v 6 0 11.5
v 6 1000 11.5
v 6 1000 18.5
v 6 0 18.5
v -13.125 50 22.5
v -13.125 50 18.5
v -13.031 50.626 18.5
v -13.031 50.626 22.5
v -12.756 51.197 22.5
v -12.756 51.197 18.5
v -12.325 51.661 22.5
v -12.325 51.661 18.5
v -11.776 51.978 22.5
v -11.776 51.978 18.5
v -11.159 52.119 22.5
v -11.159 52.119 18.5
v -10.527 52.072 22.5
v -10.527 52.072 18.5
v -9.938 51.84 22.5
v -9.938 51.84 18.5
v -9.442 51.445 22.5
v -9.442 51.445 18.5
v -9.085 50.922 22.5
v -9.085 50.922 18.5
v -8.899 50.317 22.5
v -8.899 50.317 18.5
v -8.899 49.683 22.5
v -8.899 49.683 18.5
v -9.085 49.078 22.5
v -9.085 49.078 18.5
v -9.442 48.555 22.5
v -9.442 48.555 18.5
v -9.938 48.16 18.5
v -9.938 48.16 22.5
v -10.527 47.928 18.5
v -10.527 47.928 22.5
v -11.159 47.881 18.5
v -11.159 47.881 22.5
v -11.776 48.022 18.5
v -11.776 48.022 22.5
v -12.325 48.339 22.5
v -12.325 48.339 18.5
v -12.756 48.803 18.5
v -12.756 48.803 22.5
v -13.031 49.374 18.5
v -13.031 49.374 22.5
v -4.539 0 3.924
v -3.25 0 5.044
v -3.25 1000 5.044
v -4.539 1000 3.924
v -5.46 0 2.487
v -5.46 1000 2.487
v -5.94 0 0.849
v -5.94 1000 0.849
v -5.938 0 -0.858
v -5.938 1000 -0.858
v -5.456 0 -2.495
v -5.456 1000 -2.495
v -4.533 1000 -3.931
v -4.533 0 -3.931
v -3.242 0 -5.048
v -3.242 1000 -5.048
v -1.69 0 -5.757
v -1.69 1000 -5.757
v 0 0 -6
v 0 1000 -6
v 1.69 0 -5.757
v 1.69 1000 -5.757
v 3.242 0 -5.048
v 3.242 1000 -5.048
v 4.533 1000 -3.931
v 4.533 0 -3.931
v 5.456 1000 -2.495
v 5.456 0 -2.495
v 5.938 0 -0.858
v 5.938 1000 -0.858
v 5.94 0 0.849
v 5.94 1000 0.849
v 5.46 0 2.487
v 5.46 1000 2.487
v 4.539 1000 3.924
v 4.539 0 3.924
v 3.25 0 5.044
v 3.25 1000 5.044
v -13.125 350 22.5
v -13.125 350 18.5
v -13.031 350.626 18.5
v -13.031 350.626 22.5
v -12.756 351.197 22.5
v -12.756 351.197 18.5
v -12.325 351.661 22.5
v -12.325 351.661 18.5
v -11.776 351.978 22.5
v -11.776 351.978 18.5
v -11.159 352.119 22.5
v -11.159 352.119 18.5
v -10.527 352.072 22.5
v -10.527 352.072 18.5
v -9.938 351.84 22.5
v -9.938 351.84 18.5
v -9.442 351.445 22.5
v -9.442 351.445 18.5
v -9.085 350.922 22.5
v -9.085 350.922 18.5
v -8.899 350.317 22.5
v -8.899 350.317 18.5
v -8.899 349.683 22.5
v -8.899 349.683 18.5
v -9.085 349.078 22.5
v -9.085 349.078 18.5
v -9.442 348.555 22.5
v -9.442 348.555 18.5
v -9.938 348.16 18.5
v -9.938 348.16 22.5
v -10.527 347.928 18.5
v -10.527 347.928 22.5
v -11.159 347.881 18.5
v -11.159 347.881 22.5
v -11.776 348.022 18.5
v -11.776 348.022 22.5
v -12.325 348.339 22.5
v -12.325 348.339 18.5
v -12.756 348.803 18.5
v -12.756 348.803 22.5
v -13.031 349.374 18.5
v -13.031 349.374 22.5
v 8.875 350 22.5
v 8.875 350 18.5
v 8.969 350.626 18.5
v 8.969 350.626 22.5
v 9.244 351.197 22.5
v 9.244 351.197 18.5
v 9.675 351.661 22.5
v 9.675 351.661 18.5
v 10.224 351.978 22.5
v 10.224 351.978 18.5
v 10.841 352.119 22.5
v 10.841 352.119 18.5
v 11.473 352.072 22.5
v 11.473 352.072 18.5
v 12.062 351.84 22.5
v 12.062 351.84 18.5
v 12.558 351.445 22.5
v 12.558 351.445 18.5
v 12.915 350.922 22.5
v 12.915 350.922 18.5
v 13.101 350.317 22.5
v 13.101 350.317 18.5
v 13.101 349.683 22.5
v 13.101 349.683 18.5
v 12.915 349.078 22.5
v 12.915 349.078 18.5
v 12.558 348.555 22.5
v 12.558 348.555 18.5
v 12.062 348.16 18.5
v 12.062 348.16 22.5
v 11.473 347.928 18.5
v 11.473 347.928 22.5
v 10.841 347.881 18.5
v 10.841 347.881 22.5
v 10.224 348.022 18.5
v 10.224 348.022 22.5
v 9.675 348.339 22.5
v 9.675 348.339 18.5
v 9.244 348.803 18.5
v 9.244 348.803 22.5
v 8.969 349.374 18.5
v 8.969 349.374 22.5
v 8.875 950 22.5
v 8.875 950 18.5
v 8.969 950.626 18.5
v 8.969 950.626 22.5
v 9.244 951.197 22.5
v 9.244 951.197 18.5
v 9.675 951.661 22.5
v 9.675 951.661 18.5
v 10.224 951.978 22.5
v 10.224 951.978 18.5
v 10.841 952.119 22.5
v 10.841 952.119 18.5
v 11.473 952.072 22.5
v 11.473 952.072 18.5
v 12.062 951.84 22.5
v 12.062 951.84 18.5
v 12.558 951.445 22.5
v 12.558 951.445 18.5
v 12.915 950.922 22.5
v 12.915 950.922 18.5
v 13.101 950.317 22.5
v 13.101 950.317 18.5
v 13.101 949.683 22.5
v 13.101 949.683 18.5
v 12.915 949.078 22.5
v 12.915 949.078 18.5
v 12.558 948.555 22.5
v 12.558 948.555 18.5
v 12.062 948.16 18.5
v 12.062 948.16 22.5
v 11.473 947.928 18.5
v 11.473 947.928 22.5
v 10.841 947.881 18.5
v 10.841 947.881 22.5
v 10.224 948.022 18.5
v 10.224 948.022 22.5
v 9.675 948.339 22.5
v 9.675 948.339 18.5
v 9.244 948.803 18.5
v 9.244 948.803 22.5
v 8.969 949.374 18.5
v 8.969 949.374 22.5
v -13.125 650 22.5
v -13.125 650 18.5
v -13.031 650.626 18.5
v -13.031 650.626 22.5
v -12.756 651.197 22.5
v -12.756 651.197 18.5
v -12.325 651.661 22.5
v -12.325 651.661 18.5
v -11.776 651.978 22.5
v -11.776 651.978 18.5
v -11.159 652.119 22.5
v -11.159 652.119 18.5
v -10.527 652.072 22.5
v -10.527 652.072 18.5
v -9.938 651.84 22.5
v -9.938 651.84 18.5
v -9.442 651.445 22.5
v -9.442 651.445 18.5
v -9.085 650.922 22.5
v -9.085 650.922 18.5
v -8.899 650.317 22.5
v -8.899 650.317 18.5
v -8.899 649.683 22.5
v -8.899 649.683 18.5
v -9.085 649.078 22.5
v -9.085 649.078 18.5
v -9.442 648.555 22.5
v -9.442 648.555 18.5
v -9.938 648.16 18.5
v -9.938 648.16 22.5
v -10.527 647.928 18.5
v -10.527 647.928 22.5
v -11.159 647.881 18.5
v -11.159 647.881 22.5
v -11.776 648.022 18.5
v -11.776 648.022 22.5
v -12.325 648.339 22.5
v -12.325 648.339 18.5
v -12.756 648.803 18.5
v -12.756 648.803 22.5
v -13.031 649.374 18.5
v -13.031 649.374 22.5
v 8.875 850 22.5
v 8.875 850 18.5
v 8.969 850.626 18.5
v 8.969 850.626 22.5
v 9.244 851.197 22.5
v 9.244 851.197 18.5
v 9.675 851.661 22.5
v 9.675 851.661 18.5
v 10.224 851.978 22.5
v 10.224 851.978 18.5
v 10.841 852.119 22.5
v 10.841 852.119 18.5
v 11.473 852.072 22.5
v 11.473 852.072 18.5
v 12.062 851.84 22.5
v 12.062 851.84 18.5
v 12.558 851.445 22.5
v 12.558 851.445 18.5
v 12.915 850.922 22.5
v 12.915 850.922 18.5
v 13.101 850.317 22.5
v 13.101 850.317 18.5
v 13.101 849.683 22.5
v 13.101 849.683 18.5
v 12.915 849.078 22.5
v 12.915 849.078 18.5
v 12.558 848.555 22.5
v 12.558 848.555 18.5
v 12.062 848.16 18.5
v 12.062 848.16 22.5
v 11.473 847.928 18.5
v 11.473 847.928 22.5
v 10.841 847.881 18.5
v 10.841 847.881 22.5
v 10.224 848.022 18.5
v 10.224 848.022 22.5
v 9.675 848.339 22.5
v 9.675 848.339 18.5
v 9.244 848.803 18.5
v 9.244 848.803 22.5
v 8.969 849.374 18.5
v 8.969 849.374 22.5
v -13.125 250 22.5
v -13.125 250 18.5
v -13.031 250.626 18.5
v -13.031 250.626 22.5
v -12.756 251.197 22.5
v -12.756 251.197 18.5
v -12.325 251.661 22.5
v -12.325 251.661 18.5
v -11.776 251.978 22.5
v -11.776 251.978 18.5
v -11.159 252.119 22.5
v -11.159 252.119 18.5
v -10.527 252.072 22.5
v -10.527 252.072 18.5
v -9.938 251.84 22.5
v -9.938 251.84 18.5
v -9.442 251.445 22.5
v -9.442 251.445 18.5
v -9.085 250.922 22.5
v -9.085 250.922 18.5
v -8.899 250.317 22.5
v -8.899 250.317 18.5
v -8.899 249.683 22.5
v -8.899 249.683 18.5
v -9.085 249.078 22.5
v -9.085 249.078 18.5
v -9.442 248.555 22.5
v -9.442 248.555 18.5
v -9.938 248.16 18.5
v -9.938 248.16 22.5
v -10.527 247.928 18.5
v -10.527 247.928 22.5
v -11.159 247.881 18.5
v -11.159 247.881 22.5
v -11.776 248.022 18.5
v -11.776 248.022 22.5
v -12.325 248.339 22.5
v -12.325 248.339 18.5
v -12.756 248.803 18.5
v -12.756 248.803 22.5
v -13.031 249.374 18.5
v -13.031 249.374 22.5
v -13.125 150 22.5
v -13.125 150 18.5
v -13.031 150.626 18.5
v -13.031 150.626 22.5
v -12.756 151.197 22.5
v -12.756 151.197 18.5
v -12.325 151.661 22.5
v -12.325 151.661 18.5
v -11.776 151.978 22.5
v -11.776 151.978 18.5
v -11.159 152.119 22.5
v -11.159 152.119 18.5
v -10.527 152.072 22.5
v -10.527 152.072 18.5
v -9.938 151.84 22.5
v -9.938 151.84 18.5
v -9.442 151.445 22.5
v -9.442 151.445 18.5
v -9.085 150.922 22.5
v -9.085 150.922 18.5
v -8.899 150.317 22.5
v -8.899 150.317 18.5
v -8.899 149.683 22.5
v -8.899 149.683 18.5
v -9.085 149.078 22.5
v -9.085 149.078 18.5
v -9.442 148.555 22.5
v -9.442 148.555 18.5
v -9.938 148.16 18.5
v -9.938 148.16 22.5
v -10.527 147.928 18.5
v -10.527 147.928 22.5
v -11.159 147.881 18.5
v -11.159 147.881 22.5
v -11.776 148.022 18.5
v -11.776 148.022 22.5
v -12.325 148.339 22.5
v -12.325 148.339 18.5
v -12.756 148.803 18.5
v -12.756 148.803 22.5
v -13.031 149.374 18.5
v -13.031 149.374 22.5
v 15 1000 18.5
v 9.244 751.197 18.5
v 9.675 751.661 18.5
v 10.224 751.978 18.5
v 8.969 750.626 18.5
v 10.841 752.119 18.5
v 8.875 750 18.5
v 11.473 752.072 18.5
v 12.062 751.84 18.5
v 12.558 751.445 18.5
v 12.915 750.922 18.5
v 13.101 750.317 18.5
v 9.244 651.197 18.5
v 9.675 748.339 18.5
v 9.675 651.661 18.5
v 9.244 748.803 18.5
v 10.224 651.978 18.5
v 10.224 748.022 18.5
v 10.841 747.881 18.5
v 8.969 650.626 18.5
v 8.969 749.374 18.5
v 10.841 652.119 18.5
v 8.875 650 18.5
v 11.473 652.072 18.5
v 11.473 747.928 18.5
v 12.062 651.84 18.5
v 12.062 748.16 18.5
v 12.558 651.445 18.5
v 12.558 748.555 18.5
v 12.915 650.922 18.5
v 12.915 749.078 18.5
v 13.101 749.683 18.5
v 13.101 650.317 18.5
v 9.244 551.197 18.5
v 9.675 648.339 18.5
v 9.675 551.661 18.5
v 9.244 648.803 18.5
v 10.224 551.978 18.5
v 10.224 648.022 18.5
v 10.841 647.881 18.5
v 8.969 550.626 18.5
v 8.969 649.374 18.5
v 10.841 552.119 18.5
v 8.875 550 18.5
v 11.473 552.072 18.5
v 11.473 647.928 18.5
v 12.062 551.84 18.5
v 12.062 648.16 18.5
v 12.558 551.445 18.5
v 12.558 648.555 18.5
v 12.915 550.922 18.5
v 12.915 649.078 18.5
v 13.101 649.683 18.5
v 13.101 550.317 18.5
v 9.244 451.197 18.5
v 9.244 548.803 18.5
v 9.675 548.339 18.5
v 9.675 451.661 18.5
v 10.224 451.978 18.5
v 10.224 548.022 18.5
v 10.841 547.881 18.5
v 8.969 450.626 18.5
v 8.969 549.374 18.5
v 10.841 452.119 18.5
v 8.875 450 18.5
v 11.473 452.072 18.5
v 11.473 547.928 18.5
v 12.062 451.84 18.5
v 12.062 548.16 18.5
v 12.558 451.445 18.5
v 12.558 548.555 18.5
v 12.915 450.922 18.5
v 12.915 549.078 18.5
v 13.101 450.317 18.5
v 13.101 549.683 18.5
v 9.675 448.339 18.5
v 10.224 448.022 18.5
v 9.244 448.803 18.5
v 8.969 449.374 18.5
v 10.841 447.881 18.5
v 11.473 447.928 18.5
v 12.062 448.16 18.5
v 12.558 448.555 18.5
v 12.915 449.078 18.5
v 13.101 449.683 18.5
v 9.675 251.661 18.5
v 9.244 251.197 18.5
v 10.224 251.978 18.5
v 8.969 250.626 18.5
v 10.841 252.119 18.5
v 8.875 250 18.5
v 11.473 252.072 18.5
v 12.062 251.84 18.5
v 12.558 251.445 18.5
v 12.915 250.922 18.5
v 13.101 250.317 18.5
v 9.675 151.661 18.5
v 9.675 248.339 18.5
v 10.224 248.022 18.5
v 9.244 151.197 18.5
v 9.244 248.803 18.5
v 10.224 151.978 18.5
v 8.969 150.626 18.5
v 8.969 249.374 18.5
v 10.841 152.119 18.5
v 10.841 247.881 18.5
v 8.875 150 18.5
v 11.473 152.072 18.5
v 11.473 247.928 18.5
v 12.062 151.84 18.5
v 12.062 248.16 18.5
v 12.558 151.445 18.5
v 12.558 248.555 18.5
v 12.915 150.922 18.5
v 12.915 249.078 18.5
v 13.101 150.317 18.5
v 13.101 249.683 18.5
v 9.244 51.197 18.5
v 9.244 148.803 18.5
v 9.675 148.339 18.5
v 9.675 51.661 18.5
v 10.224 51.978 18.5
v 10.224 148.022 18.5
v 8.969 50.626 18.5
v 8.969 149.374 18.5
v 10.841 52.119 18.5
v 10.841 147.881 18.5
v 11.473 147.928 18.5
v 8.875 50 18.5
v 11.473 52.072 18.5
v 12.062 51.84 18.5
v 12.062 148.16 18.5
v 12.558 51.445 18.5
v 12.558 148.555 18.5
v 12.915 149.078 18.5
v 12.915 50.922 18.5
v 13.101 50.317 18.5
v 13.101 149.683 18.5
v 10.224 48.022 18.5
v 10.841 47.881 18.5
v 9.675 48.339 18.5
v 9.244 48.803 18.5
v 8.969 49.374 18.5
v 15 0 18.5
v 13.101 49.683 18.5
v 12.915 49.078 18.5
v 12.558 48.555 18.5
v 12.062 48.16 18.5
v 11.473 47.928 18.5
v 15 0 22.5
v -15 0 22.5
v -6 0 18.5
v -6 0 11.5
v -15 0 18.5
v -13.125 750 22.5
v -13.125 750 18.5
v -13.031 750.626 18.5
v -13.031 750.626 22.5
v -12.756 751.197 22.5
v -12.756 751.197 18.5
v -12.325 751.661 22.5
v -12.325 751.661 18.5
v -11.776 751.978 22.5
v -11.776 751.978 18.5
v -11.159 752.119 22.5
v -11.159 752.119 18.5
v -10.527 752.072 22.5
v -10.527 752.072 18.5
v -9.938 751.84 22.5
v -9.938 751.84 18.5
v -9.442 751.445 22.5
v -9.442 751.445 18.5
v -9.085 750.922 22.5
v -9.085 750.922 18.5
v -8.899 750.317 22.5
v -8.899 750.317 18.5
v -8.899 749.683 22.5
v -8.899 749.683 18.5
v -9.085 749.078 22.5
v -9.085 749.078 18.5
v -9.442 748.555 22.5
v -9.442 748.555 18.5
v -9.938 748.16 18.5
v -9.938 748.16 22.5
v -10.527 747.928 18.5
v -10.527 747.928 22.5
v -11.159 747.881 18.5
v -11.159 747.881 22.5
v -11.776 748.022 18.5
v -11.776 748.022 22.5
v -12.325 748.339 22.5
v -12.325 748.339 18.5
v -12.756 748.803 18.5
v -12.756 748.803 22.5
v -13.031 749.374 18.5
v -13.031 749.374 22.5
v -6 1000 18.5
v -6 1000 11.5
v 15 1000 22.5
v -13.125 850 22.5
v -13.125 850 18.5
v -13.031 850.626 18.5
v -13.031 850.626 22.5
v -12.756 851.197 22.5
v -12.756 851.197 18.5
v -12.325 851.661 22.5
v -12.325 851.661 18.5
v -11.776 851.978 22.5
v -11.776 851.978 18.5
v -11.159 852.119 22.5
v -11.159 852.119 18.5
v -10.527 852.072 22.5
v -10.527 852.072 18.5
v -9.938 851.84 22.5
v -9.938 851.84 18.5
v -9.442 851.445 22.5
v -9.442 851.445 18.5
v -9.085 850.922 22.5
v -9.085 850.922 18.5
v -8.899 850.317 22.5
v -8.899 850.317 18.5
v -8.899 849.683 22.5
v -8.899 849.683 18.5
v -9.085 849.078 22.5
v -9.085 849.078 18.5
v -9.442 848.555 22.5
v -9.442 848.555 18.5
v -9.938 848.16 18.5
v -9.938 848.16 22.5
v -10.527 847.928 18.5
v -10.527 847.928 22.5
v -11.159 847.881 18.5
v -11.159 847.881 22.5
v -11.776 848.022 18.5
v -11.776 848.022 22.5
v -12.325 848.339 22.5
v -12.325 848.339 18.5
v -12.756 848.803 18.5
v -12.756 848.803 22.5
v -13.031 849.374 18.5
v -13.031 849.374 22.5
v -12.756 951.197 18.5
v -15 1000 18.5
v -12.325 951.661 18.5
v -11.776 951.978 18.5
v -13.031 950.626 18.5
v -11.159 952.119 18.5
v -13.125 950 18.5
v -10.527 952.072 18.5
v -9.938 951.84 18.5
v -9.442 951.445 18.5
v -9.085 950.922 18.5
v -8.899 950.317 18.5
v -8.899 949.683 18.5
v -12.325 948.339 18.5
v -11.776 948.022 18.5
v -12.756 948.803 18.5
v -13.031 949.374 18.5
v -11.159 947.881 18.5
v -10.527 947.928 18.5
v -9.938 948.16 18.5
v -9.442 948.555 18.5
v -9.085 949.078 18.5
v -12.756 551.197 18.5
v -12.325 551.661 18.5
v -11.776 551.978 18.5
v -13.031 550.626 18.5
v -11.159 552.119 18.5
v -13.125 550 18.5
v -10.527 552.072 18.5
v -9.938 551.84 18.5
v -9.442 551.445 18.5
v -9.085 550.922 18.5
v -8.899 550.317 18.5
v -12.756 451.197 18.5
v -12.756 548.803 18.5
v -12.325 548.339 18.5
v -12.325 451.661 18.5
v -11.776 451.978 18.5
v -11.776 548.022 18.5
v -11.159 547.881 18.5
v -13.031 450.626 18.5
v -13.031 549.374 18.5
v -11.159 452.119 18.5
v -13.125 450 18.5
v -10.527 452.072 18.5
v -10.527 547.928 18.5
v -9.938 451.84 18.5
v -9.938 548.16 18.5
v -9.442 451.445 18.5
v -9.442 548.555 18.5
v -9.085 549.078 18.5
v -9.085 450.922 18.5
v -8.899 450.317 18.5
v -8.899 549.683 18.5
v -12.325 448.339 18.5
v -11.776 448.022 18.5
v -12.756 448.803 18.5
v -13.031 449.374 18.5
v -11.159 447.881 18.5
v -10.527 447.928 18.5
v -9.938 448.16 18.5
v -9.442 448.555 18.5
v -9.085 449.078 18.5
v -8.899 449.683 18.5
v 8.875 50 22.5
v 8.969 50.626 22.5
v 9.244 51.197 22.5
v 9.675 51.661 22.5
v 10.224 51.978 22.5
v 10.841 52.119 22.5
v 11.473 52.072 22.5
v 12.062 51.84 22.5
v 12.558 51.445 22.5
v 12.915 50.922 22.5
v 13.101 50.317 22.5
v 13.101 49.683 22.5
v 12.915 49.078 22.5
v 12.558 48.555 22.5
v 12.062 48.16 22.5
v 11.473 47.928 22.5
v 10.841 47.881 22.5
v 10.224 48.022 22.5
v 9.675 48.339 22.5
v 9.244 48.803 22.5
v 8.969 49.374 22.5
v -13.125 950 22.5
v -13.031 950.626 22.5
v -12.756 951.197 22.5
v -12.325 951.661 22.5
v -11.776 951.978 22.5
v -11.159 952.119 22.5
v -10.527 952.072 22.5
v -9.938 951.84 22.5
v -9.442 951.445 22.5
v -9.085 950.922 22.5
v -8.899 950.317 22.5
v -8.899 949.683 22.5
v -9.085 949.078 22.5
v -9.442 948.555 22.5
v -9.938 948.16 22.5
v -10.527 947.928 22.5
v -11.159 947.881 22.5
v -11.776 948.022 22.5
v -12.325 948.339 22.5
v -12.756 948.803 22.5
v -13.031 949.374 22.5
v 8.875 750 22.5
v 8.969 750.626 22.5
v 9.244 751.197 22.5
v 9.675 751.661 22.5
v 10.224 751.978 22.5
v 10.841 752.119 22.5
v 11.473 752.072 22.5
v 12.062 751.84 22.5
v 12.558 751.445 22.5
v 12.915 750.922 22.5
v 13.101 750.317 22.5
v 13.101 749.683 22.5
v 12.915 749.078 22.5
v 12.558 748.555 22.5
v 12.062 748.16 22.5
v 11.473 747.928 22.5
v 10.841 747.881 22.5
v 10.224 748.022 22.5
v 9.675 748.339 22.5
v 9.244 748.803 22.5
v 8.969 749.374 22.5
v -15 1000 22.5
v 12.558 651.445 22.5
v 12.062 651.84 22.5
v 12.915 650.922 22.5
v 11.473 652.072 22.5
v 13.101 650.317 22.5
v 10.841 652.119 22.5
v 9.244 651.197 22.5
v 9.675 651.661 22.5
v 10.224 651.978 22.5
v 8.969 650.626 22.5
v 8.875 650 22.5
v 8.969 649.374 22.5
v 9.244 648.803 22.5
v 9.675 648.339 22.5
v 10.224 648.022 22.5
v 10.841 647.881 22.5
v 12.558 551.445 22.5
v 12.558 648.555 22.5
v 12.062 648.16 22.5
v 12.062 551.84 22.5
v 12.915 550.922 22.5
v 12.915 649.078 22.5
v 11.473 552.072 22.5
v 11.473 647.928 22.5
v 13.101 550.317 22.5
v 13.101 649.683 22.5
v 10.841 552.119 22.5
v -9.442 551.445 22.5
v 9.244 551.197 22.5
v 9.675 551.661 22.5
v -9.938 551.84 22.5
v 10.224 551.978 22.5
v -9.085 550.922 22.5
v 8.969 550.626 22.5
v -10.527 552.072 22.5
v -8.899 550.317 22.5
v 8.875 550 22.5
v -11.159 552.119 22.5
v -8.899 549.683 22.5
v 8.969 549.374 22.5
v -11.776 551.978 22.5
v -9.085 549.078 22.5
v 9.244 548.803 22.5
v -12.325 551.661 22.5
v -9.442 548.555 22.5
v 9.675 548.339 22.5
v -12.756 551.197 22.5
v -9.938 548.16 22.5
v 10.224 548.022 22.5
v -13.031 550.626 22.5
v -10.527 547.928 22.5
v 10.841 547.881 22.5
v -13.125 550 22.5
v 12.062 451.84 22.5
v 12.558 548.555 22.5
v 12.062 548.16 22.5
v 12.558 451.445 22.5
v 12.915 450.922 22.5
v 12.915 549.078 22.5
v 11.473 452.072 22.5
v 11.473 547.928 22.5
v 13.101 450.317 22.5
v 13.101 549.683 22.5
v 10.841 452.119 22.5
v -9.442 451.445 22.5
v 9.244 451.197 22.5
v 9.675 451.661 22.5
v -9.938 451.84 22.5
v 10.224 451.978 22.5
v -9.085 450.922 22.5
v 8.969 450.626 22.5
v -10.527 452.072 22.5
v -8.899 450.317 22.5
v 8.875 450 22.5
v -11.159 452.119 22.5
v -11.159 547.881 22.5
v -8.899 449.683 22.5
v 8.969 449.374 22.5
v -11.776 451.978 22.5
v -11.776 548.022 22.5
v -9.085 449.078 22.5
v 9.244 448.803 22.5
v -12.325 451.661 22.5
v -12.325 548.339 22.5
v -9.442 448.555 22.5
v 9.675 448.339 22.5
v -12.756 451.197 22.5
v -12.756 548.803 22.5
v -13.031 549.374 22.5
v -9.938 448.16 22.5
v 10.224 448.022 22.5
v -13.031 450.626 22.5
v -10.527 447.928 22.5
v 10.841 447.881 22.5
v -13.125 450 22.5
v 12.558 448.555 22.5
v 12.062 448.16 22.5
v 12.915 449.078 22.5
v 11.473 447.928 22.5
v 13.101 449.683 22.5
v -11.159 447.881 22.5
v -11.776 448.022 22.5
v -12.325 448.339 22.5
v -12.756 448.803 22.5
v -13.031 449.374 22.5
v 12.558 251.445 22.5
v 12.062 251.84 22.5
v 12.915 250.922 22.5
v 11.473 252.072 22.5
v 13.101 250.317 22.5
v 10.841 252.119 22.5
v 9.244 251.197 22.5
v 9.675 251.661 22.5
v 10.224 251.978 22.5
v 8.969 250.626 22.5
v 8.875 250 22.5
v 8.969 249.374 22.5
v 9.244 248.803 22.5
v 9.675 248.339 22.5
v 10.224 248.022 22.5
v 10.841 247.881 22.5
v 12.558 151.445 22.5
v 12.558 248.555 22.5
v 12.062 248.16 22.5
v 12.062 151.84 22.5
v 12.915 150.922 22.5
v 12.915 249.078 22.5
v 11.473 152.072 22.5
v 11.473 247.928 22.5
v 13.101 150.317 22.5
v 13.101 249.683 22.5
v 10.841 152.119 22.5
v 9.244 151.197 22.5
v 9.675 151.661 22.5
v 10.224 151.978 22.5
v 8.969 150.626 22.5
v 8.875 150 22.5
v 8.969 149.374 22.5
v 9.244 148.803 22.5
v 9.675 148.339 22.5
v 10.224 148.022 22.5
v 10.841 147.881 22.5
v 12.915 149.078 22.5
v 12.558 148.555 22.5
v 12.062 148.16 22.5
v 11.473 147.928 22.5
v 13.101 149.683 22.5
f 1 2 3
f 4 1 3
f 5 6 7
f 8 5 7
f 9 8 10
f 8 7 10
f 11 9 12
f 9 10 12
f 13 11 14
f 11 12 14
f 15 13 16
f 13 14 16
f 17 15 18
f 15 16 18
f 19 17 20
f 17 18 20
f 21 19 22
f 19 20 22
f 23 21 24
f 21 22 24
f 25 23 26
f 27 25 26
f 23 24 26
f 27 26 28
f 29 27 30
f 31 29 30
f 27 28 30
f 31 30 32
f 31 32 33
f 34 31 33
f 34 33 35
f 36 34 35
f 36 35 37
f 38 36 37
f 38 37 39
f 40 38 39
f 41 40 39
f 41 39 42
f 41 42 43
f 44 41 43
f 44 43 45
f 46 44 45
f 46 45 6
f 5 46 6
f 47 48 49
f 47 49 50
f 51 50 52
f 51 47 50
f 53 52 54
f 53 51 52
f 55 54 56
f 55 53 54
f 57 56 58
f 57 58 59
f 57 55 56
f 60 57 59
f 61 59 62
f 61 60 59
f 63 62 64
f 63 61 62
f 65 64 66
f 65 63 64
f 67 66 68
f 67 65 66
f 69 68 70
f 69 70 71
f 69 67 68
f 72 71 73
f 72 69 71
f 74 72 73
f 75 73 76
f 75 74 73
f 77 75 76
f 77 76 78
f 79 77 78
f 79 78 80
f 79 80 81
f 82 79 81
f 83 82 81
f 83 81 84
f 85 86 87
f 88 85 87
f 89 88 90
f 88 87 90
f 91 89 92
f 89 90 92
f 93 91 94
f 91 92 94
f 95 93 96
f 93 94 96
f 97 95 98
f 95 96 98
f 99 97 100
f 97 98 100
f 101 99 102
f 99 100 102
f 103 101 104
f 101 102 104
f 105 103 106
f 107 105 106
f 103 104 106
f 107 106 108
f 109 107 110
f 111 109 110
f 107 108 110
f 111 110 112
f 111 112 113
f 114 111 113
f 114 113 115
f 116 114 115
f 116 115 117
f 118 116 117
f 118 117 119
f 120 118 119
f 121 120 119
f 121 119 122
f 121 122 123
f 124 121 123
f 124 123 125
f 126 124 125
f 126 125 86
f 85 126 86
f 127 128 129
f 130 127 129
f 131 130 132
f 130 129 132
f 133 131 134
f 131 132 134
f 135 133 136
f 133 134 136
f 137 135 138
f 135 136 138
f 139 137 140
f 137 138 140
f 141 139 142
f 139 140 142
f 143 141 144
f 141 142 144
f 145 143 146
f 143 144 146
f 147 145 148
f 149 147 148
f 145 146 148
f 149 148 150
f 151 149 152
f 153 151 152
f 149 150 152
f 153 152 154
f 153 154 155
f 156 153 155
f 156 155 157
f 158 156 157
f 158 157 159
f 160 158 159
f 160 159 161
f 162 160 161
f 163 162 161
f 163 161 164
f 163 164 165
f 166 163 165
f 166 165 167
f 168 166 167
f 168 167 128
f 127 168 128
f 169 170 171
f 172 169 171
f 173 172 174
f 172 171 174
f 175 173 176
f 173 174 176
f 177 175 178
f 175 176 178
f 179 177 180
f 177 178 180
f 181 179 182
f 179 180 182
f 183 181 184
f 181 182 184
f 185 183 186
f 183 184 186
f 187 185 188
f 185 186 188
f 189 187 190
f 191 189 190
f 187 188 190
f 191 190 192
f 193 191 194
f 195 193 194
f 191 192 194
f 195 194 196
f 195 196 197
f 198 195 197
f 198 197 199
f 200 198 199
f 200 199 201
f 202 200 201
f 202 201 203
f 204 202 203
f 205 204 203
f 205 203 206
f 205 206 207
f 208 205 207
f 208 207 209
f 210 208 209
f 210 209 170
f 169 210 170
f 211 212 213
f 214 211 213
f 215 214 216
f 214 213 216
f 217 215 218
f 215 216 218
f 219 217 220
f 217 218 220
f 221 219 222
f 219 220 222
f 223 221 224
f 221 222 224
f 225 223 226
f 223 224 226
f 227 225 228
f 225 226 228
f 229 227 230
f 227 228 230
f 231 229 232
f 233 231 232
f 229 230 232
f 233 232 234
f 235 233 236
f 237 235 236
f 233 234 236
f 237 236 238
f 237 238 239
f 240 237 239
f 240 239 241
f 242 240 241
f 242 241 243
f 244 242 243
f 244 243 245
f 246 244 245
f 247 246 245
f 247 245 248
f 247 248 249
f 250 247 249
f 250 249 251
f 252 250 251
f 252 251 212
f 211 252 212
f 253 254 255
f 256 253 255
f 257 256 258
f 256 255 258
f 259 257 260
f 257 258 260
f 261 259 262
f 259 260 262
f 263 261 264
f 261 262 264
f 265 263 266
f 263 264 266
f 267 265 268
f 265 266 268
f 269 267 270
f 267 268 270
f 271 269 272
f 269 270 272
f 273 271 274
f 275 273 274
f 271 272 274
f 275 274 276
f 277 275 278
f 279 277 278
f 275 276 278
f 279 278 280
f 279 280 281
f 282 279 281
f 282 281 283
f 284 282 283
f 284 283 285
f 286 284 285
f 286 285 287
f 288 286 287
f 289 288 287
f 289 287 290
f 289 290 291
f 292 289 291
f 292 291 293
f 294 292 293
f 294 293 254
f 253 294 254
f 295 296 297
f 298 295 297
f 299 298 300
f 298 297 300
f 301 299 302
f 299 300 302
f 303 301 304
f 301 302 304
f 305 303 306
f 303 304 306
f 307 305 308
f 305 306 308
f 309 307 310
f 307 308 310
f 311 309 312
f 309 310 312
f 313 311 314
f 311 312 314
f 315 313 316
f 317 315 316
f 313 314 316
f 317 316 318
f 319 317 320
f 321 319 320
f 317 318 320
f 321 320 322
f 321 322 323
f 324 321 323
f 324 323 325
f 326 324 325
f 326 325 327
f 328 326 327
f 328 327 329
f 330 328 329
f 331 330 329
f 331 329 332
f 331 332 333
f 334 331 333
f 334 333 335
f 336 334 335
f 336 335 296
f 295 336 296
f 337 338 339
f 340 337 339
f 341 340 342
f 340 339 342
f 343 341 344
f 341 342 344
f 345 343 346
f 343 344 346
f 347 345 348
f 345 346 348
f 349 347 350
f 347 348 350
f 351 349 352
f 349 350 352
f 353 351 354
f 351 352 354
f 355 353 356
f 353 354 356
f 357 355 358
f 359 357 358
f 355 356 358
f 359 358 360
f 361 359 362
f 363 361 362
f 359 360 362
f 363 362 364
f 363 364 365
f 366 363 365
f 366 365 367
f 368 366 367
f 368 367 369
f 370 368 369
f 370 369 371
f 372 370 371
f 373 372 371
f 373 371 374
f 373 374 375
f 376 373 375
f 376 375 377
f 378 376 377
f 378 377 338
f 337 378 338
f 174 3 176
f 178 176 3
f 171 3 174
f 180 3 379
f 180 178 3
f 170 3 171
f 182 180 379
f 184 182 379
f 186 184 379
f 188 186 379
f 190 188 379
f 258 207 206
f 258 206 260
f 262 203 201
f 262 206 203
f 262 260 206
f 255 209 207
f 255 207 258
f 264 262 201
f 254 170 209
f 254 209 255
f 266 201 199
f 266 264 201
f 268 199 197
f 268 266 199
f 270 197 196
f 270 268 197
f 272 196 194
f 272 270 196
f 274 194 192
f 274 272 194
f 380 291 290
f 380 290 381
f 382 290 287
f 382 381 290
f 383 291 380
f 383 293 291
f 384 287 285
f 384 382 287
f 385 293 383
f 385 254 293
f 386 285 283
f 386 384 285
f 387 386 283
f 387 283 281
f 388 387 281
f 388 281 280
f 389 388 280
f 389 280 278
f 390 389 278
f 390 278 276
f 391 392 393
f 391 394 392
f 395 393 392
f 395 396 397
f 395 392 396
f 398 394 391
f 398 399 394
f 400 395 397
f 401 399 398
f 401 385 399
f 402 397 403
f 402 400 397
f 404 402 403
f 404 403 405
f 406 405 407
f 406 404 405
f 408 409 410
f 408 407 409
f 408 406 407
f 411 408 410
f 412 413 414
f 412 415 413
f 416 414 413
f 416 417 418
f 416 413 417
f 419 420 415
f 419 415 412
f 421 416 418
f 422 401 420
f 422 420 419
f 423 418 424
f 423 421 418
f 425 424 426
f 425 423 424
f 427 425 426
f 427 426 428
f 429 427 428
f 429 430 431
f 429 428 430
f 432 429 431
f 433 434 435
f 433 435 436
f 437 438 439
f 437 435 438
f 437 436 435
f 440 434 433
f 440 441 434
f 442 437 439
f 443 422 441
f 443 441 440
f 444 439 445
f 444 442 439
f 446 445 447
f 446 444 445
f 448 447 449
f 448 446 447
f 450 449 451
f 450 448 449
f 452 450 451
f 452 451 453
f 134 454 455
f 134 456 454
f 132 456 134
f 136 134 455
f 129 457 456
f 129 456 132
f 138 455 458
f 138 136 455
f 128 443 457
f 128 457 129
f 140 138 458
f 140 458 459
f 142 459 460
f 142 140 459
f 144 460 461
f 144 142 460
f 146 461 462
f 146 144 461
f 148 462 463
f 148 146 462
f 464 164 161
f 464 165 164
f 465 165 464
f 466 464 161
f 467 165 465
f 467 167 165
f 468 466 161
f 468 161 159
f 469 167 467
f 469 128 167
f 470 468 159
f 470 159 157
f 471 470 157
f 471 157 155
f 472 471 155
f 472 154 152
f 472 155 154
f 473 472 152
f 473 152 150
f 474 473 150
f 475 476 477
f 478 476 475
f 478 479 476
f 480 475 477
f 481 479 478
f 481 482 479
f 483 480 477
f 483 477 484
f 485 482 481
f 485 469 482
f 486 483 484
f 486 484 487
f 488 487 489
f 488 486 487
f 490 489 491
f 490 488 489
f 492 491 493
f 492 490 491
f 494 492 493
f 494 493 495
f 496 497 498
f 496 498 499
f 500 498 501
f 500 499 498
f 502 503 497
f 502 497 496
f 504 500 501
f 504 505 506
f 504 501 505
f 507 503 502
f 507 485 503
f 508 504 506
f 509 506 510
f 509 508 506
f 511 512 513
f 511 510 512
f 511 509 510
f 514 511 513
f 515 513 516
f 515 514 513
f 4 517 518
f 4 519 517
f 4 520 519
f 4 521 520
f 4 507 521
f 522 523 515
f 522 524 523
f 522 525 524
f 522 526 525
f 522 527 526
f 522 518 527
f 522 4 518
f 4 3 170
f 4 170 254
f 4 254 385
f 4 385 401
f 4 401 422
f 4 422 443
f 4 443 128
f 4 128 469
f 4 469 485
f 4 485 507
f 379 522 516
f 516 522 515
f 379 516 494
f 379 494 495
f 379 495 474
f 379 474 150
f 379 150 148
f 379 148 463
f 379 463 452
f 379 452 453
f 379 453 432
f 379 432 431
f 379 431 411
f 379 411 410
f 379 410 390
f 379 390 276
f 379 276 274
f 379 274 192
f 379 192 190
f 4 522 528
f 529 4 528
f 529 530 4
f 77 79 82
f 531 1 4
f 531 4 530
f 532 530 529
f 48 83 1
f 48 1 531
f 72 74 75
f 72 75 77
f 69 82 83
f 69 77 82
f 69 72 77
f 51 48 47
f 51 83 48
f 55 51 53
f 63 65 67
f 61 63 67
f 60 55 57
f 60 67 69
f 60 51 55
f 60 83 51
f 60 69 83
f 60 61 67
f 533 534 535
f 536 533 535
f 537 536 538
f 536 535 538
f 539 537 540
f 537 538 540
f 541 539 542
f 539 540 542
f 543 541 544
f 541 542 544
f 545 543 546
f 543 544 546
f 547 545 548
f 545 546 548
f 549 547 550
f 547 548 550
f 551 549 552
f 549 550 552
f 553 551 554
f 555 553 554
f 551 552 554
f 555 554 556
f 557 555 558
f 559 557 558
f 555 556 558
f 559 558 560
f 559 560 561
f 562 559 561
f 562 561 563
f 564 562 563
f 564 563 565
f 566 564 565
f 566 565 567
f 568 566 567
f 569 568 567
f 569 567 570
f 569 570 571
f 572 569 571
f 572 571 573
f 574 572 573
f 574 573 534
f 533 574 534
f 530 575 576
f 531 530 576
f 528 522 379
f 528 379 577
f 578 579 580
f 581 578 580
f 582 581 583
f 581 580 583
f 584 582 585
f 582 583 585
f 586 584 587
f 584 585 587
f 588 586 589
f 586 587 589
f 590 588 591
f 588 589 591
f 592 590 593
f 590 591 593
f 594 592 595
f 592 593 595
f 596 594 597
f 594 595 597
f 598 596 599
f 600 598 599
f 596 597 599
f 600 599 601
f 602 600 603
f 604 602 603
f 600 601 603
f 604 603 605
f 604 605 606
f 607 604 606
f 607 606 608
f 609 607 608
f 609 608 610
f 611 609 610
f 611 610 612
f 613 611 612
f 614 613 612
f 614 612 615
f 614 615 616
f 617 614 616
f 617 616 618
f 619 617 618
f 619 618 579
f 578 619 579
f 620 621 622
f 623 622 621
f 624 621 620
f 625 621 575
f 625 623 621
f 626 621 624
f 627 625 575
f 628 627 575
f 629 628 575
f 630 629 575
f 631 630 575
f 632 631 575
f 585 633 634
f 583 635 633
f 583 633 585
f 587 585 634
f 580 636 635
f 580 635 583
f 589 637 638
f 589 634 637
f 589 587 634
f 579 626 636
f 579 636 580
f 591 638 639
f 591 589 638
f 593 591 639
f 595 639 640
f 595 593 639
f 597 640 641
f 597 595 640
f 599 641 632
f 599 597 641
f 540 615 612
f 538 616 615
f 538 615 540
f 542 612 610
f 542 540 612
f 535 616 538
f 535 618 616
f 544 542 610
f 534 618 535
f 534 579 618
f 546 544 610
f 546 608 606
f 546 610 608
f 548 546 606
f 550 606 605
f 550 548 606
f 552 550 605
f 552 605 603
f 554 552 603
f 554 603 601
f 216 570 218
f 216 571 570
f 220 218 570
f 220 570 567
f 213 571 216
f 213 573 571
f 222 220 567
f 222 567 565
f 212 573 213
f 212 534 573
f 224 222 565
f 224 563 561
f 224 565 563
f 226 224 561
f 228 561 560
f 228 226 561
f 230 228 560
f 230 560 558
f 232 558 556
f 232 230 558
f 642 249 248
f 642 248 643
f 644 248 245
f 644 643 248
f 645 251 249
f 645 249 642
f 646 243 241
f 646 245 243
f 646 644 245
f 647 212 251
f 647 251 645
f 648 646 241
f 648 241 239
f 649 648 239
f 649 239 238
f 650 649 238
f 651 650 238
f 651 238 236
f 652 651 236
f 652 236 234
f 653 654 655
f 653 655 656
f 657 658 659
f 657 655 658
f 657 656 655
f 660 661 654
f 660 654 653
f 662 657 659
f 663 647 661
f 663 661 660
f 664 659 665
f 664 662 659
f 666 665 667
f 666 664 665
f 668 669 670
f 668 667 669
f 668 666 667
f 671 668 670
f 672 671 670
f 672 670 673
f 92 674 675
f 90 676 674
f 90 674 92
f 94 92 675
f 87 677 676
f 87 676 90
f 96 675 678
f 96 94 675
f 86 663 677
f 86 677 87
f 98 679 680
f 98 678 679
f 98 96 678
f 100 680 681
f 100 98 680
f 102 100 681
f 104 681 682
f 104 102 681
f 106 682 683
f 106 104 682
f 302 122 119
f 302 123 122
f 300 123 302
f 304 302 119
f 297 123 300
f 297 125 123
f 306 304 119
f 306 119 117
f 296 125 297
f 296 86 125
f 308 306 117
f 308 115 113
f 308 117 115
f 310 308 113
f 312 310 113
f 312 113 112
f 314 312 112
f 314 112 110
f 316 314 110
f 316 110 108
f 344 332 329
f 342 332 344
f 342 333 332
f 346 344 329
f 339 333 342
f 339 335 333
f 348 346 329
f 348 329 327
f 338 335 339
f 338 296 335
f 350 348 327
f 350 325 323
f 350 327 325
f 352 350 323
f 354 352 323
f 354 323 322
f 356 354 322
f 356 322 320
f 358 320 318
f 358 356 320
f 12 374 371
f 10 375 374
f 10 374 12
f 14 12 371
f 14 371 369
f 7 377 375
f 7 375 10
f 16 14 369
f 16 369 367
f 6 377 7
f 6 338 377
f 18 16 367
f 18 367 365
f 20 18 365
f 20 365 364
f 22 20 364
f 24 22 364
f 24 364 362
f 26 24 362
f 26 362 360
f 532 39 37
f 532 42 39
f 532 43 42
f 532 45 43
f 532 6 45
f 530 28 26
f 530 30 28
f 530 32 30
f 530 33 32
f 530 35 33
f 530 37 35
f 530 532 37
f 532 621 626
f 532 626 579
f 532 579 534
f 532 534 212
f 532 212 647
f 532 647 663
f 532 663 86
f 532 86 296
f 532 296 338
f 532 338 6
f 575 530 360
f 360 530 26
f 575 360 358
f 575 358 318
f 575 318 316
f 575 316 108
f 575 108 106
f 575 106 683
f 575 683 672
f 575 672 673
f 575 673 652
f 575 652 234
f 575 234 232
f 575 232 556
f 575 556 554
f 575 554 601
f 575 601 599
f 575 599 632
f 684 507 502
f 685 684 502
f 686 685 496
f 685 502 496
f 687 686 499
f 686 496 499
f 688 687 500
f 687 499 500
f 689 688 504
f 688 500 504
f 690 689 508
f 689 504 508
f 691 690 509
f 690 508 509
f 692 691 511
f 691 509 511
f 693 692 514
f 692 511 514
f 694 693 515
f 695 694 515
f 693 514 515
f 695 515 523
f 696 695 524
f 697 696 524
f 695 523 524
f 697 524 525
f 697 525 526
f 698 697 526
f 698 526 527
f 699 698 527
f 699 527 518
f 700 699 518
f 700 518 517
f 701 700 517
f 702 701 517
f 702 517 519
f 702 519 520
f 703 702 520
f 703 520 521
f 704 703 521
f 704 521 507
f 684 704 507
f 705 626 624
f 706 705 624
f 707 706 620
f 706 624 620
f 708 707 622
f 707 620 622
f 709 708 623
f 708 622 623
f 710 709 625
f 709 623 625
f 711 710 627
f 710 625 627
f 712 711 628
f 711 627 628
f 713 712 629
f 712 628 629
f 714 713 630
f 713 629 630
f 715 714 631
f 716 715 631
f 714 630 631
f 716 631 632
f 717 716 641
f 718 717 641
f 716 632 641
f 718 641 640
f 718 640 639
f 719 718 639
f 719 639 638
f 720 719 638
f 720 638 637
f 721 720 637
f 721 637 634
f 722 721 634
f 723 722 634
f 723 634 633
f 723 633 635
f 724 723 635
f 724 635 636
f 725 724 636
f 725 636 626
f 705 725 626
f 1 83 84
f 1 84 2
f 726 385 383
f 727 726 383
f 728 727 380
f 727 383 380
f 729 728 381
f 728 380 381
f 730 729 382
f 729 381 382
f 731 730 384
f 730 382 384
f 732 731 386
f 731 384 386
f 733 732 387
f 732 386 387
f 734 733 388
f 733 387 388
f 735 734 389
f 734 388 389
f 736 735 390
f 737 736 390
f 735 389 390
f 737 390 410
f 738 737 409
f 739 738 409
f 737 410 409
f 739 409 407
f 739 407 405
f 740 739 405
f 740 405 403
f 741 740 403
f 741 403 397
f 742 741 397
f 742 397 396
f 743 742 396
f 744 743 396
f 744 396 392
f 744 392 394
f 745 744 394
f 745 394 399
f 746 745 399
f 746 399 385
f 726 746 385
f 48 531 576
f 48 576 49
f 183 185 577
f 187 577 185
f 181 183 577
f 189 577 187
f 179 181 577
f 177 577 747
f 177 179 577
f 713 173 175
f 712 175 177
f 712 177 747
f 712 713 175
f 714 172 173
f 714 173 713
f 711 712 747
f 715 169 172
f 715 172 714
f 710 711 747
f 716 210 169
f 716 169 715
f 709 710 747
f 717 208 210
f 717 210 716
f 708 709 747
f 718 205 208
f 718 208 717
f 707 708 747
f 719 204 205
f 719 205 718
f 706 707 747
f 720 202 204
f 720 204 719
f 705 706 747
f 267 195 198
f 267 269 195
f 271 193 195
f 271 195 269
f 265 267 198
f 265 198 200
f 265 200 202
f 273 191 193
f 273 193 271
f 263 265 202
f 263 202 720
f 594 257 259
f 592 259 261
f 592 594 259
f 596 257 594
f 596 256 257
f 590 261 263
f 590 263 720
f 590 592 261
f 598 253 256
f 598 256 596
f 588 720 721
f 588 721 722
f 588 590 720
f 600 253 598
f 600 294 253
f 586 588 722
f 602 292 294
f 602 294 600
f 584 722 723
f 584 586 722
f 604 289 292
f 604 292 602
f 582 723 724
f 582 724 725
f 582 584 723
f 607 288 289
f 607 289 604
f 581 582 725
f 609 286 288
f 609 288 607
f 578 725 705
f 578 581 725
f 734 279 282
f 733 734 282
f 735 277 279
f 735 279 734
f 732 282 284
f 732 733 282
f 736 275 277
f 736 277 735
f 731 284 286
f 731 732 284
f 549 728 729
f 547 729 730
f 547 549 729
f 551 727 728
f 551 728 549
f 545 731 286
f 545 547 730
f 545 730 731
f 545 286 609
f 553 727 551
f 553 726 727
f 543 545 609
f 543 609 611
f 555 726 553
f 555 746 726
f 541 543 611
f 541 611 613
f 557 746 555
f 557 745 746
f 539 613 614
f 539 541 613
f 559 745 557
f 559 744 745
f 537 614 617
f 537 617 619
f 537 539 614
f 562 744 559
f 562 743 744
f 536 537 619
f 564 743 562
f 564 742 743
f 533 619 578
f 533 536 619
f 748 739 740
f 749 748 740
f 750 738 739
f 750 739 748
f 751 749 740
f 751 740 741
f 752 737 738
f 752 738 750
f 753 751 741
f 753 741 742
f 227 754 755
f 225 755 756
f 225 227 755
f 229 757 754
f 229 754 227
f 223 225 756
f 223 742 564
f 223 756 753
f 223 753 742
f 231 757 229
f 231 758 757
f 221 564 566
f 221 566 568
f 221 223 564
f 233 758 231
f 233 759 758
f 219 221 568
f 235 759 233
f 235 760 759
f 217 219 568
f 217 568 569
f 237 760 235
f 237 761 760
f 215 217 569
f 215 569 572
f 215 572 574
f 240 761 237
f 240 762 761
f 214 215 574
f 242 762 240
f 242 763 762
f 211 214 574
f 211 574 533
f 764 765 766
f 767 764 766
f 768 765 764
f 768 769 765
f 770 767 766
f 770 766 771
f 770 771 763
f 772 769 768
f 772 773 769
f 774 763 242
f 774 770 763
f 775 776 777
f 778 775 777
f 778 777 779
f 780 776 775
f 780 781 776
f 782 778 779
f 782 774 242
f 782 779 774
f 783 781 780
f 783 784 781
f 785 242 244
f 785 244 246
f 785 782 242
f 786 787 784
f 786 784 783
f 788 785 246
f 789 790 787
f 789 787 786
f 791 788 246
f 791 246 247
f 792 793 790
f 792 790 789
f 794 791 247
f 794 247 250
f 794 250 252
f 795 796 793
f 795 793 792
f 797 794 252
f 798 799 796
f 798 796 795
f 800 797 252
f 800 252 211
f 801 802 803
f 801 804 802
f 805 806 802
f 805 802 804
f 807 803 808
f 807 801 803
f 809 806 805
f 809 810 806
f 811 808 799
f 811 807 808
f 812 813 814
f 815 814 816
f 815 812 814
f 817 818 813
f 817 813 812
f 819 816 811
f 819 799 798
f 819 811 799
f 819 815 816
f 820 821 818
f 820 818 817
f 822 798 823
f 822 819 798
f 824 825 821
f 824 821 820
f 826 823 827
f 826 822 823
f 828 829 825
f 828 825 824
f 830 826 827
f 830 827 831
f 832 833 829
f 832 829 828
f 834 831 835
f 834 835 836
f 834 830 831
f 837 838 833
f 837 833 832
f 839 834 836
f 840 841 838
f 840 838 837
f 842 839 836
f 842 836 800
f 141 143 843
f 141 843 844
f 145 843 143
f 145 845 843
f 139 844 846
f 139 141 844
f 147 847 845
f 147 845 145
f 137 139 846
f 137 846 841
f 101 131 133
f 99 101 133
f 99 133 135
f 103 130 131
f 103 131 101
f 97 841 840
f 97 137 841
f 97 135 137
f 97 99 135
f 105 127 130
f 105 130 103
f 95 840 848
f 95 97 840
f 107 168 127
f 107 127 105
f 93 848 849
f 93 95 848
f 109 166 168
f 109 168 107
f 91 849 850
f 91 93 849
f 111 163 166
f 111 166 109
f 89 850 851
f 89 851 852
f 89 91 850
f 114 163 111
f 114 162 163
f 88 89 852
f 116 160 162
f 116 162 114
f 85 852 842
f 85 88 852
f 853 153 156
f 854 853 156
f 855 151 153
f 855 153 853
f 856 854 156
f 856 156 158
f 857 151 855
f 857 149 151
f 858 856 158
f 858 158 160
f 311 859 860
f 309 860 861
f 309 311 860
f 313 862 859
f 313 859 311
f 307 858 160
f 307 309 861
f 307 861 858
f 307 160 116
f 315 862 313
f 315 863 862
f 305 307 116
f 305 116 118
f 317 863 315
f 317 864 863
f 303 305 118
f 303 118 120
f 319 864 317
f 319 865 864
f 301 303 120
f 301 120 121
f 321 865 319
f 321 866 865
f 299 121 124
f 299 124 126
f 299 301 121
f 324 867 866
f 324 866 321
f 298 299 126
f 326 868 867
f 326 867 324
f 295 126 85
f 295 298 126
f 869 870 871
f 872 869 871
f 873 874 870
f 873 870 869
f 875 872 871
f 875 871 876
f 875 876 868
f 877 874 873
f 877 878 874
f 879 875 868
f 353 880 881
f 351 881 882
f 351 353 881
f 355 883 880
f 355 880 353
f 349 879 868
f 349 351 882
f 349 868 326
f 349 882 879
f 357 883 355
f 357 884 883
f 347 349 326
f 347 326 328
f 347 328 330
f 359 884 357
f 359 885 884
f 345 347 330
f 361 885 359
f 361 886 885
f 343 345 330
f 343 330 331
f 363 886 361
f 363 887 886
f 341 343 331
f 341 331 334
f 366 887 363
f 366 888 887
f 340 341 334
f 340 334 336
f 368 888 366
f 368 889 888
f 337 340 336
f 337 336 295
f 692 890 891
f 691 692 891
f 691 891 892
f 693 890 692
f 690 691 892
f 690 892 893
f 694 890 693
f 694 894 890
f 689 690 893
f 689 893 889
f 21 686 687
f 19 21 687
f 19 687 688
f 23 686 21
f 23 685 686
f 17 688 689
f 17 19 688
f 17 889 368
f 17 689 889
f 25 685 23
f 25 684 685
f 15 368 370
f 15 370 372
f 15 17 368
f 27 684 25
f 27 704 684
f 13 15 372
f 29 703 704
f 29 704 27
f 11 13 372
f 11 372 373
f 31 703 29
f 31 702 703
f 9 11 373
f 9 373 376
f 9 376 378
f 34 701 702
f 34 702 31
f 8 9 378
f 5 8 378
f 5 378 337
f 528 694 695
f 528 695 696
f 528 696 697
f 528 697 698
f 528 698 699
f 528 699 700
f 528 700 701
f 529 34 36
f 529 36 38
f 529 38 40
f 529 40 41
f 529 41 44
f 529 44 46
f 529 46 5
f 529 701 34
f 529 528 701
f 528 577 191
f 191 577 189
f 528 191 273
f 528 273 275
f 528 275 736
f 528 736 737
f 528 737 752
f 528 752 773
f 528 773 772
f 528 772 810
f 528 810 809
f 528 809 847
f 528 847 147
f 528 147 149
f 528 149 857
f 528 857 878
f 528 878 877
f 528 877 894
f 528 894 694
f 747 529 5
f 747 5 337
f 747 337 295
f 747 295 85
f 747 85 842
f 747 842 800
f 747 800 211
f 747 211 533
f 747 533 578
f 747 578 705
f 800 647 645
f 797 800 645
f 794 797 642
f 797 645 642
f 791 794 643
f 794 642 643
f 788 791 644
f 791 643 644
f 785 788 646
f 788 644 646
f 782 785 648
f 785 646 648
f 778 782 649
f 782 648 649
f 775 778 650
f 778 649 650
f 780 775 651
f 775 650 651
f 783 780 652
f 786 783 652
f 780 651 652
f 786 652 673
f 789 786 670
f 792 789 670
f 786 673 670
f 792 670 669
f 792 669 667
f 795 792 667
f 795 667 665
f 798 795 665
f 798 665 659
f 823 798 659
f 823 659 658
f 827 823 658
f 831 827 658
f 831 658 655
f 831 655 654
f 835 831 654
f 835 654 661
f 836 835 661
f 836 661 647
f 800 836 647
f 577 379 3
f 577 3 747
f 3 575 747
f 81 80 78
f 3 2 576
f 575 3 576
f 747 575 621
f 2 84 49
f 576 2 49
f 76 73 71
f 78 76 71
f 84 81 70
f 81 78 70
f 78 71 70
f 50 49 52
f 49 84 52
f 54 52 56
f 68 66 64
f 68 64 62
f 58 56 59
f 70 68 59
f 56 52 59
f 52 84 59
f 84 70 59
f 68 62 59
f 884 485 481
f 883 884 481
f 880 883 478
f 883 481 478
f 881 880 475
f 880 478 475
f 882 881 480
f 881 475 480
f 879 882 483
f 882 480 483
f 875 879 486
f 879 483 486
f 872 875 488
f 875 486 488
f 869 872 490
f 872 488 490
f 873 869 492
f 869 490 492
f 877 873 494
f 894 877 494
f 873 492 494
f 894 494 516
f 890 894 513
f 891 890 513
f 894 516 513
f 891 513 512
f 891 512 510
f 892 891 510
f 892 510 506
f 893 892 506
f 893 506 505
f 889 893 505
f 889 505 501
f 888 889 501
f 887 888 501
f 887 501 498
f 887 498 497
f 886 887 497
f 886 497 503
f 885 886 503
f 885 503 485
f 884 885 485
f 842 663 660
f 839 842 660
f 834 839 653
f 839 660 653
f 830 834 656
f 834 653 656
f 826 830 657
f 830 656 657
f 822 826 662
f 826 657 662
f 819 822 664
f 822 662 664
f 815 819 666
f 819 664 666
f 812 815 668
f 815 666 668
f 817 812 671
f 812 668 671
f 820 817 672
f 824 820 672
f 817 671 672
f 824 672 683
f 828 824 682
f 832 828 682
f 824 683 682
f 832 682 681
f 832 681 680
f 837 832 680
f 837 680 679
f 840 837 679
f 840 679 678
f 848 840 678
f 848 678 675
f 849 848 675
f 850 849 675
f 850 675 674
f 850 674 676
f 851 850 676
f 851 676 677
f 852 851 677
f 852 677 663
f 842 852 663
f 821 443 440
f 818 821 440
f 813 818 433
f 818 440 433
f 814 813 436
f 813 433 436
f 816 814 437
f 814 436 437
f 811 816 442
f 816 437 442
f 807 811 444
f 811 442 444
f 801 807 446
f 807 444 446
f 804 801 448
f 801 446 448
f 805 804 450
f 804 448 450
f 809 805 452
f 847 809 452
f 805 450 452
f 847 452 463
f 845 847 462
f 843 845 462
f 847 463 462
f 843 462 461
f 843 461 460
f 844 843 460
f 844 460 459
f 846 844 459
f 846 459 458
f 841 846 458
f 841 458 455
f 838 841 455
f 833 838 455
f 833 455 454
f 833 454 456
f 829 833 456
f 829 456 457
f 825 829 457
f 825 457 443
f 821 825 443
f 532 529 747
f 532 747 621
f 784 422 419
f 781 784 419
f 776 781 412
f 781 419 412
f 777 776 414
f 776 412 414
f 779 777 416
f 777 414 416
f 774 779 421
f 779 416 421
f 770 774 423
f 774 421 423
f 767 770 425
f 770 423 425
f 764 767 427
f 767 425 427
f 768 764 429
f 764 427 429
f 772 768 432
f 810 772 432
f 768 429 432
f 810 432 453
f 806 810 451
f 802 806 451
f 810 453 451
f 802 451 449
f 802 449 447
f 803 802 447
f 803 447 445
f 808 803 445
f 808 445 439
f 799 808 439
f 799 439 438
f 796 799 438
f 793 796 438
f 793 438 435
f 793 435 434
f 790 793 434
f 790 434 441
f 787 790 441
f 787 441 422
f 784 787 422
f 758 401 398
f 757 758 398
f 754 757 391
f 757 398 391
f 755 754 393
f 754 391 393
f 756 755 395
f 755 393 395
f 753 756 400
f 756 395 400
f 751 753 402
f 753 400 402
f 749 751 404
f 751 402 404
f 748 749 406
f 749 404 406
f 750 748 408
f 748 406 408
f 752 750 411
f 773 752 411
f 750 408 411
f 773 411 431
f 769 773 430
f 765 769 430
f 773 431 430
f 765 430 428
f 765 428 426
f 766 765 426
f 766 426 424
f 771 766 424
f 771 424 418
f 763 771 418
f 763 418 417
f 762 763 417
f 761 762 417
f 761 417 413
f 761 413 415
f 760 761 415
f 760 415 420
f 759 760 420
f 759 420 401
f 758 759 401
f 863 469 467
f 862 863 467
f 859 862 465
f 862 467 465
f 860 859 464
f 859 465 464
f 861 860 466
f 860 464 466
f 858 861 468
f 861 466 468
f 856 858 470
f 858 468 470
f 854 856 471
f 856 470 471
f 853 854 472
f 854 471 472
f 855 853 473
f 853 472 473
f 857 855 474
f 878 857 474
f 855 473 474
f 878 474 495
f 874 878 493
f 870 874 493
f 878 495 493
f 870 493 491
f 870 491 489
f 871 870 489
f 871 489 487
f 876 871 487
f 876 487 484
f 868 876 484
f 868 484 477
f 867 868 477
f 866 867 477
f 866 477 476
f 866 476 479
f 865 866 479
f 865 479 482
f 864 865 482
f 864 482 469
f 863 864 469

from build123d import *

# Parameters (mm, degrees)
BOSS_EXTRUDE1_DEPTH = 1000
SKETCH2_R           = 2.125
CUT_EXTRUDE1_DEPTH  = 5
LPATTERN1_COUNT     = 10
LPATTERN1_PITCH     = 100


with BuildPart() as part:
    # Sketch1 → Boss-Extrude1 (new body)
    with BuildSketch(Plane(origin=(0, 0, 0), x_dir=(1, 0, 0), z_dir=(0, 1, 0))):
        with BuildLine():
            Line((15, -22.5), (-15, -22.5))
            Line((-15, -22.5), (-15, -18.5))
            Line((-15, -18.5), (-6, -18.5))
            Line((-6, -18.5), (-6, -11.5))
            Line((-6, -11.5), (-3.25, -5.04356025))
            ThreePointArc((-3.25, -5.04356025), (0, 6), (3.25, -5.04356025))
            Line((3.25, -5.04356025), (6, -11.5))
            Line((6, -11.5), (6, -18.5))
            Line((6, -18.5), (15, -18.5))
            Line((15, -18.5), (15, -22.5))
        make_face()
    extrude(amount=BOSS_EXTRUDE1_DEPTH)

    # Sketch2 → Cut-Extrude1 (cut, through all)
    with BuildSketch(Plane(origin=(0, 0, 18.5), x_dir=(-1, 0, 0), z_dir=(0, 0, -1))):
        with Locations((-11, 950)):
            Circle(SKETCH2_R)
        with Locations((11, 950)):
            Circle(SKETCH2_R)
    cut_extrude1 = extrude(amount=-CUT_EXTRUDE1_DEPTH, mode=Mode.SUBTRACT)

    # LPattern1: Cut-Extrude1 ×10
    with Locations(*[(0, -i * LPATTERN1_PITCH, 0) for i in range(1, LPATTERN1_COUNT)]):
        add(cut_extrude1, mode=Mode.SUBTRACT)


solid = part.part
